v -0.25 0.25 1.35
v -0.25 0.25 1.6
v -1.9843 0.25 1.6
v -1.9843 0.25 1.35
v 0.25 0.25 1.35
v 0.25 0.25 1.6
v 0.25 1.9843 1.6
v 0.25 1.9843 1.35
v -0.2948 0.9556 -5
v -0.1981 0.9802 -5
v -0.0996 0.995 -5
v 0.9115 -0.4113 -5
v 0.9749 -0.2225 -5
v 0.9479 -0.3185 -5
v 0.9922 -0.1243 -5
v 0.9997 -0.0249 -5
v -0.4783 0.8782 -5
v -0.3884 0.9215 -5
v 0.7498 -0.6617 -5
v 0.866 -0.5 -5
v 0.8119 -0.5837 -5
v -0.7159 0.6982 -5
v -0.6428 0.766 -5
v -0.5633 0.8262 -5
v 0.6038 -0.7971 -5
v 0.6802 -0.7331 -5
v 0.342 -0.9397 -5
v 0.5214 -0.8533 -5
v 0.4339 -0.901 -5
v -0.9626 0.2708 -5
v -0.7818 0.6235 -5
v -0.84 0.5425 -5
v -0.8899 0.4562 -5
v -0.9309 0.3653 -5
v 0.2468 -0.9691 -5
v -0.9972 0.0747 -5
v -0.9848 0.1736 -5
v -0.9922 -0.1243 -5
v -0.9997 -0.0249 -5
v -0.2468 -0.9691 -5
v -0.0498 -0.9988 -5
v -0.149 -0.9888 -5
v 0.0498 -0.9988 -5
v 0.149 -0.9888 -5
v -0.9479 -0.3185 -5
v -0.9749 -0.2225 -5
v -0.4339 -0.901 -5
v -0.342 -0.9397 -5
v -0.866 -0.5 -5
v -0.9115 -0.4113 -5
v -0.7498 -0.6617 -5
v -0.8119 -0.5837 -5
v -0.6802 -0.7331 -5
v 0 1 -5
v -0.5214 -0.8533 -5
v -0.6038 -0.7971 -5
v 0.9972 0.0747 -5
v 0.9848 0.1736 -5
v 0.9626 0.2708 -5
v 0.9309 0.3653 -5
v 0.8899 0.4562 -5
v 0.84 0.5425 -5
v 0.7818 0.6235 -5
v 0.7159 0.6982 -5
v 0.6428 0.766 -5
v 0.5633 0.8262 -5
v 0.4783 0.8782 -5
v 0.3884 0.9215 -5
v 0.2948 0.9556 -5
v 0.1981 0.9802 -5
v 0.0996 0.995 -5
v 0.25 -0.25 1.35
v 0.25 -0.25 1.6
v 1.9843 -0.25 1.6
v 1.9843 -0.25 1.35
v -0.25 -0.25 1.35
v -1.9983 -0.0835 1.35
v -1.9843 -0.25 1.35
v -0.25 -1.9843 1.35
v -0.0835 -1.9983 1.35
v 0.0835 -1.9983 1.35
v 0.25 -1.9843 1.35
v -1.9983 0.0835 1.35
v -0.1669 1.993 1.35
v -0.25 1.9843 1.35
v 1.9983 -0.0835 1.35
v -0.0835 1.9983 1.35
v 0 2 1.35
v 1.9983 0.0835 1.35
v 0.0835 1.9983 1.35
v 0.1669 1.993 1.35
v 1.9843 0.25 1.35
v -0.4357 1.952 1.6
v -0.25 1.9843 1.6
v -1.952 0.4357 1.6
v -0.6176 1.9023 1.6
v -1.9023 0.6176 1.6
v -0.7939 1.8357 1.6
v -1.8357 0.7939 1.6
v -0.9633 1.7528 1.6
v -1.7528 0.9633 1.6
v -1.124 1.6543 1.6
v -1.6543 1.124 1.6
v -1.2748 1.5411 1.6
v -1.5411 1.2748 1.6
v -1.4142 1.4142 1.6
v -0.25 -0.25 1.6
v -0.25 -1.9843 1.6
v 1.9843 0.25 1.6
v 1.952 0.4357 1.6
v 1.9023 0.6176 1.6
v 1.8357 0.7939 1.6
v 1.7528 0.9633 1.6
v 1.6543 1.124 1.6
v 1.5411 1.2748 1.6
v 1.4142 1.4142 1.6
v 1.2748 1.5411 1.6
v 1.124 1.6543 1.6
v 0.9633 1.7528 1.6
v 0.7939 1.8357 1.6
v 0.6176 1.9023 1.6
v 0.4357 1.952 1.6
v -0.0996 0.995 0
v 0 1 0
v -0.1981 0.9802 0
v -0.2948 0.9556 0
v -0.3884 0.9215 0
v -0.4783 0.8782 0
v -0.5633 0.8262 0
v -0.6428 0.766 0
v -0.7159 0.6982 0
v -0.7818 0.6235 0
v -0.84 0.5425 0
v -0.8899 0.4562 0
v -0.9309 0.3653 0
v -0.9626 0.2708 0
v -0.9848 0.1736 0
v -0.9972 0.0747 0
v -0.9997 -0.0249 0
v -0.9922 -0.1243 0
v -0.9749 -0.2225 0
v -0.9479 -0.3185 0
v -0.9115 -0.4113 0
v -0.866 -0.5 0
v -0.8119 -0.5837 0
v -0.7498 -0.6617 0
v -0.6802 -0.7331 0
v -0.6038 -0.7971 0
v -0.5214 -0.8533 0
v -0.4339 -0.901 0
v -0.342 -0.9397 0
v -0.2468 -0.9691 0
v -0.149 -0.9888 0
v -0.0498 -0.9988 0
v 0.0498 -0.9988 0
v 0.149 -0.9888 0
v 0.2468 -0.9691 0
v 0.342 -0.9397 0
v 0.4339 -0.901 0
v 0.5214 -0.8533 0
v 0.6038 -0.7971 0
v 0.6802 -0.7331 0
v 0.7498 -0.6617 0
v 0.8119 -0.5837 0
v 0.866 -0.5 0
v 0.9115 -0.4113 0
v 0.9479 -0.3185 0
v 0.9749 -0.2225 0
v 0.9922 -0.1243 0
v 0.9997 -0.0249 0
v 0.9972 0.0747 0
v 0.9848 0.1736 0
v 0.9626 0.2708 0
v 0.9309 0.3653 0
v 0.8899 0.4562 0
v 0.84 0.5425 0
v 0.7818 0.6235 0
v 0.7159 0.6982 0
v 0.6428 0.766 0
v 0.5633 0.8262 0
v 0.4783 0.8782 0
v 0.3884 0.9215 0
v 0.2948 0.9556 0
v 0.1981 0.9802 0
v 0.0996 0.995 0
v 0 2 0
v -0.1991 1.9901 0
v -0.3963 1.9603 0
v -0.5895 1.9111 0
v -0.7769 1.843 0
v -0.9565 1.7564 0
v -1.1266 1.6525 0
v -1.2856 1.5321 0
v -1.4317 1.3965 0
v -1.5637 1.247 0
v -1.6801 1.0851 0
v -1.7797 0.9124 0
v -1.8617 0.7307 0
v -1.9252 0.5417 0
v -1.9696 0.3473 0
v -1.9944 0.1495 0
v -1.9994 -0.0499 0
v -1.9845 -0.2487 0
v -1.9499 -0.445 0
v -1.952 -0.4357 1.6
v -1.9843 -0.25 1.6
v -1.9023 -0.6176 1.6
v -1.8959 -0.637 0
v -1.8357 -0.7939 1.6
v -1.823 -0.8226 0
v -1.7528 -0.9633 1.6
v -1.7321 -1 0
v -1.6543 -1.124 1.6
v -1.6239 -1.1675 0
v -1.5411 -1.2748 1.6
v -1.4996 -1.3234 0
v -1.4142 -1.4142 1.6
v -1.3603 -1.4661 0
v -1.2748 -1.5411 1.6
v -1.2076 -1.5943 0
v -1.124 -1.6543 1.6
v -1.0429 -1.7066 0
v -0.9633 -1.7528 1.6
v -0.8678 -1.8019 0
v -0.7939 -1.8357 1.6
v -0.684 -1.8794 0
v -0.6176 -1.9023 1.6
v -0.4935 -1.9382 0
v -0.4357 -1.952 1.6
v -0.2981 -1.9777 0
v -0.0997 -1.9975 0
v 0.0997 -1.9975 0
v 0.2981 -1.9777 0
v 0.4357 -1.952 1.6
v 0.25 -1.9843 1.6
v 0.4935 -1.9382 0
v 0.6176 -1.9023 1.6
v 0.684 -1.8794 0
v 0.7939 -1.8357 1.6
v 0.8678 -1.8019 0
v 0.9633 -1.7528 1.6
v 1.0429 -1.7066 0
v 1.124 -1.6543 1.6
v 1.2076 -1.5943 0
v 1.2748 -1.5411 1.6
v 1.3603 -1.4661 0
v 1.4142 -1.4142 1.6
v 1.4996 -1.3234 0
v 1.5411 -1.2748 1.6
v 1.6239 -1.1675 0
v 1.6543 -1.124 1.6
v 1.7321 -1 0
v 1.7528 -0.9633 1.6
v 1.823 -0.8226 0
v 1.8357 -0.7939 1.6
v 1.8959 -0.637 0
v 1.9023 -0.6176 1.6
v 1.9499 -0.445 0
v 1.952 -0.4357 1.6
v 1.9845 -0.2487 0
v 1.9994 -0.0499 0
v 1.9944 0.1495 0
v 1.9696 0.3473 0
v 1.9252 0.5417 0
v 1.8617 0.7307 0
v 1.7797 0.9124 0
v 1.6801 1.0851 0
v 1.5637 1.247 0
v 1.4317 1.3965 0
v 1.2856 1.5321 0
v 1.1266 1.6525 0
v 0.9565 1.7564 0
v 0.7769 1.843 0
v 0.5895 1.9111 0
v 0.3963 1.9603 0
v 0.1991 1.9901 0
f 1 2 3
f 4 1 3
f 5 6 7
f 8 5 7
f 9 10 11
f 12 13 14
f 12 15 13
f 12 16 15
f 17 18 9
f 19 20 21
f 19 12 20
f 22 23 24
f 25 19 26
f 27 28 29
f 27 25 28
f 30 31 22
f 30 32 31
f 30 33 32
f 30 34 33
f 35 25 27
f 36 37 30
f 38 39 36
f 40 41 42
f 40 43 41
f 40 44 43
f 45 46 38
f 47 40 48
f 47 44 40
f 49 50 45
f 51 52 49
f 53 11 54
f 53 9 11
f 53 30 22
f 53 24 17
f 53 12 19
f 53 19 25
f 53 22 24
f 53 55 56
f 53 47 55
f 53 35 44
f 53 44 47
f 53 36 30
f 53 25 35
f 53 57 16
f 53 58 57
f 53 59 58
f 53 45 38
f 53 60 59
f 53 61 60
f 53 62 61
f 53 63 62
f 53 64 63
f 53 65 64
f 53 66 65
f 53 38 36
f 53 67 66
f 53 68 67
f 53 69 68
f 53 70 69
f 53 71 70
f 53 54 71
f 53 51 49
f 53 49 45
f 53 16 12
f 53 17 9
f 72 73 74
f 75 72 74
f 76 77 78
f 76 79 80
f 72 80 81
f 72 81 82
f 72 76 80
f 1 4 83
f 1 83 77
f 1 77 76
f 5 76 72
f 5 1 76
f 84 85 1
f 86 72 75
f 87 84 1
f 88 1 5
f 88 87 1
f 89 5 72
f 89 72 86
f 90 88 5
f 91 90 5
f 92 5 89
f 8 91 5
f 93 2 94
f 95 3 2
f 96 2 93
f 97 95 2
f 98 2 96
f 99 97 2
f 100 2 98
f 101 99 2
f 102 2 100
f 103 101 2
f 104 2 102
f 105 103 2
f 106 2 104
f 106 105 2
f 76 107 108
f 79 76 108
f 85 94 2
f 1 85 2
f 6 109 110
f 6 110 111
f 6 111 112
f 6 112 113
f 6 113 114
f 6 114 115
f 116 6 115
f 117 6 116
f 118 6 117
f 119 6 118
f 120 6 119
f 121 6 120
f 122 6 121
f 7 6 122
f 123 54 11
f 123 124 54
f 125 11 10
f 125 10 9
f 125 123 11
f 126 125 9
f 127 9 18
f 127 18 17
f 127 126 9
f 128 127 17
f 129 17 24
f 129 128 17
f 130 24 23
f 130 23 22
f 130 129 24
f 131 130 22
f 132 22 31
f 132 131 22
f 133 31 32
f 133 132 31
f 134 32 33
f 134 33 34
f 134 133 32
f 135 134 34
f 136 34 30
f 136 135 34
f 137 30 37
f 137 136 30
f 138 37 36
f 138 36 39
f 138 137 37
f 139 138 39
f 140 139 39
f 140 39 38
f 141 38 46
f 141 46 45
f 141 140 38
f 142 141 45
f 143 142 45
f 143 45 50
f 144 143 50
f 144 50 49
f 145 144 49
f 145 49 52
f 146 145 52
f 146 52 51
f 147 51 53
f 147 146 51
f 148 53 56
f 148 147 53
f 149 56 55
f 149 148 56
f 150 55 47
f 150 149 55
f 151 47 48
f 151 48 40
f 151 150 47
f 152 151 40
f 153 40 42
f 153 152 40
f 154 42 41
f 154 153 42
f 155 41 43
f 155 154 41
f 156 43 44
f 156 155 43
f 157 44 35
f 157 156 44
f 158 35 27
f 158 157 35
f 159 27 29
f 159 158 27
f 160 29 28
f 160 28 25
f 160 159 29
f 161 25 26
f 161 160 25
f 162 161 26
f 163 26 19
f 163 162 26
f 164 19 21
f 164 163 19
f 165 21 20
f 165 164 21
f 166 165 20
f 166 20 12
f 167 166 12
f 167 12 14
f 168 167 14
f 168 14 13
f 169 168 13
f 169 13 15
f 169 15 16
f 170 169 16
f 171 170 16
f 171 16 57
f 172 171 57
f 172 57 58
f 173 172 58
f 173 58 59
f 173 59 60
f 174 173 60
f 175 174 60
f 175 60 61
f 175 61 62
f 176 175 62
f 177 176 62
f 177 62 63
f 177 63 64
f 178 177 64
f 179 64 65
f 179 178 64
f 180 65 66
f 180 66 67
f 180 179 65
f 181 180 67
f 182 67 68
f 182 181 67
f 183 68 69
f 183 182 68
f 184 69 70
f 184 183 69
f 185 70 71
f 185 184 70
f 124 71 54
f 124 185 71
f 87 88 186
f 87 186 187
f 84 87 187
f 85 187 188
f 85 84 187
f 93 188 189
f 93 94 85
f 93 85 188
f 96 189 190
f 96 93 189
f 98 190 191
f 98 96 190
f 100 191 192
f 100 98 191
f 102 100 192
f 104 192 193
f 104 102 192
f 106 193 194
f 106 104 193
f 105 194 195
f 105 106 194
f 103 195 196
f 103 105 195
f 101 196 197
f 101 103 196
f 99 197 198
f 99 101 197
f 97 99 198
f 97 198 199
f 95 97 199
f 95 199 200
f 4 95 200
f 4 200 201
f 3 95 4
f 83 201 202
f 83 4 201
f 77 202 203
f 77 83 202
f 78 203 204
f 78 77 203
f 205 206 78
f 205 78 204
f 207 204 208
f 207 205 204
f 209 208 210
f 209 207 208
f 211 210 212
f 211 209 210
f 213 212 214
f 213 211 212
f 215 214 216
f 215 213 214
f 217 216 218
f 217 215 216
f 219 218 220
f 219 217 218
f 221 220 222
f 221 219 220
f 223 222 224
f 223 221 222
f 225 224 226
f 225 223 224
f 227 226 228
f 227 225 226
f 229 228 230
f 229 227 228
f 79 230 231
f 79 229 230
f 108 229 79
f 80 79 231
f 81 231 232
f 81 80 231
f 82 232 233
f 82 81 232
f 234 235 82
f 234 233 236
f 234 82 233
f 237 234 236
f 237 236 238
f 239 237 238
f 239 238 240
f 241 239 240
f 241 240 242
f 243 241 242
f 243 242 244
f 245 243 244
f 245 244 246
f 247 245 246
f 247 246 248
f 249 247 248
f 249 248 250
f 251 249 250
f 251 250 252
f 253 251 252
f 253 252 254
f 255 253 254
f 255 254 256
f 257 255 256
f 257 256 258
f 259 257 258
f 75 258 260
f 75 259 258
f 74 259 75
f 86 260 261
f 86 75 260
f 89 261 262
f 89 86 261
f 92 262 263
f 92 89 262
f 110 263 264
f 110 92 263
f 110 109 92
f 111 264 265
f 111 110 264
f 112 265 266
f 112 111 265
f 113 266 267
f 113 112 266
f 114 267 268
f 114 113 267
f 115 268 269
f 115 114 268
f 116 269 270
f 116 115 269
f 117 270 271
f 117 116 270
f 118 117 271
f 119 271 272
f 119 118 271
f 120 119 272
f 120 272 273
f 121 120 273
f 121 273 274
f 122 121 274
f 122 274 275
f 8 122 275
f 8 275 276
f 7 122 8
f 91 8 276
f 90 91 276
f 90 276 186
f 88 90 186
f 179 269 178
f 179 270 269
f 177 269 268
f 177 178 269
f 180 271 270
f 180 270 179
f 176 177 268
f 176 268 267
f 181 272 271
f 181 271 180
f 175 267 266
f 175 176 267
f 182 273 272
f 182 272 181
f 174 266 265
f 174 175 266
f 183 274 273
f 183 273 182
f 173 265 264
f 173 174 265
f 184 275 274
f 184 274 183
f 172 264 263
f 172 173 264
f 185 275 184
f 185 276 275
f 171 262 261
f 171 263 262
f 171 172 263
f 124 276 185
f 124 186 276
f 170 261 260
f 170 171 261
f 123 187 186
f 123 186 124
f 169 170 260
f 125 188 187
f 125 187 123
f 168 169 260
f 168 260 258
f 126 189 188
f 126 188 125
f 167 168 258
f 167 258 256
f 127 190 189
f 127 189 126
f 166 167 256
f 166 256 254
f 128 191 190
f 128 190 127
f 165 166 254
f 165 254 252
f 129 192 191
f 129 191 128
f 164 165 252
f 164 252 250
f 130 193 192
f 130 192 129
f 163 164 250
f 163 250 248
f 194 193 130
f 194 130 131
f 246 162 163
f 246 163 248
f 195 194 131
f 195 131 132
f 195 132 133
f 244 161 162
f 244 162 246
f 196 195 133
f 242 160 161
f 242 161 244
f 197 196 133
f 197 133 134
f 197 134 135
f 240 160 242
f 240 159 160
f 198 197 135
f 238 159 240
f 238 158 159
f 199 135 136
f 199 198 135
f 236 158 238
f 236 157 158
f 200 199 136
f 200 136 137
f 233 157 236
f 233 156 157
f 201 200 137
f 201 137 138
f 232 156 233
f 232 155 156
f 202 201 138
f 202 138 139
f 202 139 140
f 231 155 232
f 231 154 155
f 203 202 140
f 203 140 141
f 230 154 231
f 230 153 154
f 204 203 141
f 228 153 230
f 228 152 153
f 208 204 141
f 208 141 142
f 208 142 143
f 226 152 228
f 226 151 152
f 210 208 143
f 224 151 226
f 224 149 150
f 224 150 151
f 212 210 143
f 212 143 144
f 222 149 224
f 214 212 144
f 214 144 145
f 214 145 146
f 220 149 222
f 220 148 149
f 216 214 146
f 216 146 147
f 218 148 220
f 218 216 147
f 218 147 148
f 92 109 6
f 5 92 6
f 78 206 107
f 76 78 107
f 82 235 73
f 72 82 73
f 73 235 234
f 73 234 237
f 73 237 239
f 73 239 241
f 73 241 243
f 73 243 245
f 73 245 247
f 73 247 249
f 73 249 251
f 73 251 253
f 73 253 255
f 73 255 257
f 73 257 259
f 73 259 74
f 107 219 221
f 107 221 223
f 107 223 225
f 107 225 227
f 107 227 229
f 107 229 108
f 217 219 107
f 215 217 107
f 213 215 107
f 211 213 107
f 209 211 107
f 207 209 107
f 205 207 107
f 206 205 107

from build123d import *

# Parameters (mm, degrees)
CUT_EXTRUDE1_DEPTH = 0.25


with BuildPart() as part:
    # Sketch1 → Revolve1 (revolve)
    with BuildSketch(Plane(origin=(0, 0, 0), x_dir=(0, 0, -1), z_dir=(1, 0, 0))):
        Polygon((0, 1), (0, 2), (-1.6, 2), (-1.6, 0), (5, 0), (5, 1), align=None)
    revolve(axis=Axis((0, 0, -5), (0, 0, 1)))

    # Sketch2 → Cut-Extrude1 (cut)
    with BuildSketch(Plane.XY.offset(1.6)):
        Polygon((-2, -0.25), (-0.25, -0.25), (-0.25, -2), (0, -2.25), (0.25, -2), (0.25, -0.25), (2, -0.25), (2.364373172, -0.114373172), (2, 0.25), (0.25, 0.25), (0.25, 2), (0, 2.480239465), (-0.25, 2), (-0.25, 0.25), (-2, 0.25), (-2.25, 0), align=None)
    extrude(amount=-CUT_EXTRUDE1_DEPTH, mode=Mode.SUBTRACT)


solid = part.part
